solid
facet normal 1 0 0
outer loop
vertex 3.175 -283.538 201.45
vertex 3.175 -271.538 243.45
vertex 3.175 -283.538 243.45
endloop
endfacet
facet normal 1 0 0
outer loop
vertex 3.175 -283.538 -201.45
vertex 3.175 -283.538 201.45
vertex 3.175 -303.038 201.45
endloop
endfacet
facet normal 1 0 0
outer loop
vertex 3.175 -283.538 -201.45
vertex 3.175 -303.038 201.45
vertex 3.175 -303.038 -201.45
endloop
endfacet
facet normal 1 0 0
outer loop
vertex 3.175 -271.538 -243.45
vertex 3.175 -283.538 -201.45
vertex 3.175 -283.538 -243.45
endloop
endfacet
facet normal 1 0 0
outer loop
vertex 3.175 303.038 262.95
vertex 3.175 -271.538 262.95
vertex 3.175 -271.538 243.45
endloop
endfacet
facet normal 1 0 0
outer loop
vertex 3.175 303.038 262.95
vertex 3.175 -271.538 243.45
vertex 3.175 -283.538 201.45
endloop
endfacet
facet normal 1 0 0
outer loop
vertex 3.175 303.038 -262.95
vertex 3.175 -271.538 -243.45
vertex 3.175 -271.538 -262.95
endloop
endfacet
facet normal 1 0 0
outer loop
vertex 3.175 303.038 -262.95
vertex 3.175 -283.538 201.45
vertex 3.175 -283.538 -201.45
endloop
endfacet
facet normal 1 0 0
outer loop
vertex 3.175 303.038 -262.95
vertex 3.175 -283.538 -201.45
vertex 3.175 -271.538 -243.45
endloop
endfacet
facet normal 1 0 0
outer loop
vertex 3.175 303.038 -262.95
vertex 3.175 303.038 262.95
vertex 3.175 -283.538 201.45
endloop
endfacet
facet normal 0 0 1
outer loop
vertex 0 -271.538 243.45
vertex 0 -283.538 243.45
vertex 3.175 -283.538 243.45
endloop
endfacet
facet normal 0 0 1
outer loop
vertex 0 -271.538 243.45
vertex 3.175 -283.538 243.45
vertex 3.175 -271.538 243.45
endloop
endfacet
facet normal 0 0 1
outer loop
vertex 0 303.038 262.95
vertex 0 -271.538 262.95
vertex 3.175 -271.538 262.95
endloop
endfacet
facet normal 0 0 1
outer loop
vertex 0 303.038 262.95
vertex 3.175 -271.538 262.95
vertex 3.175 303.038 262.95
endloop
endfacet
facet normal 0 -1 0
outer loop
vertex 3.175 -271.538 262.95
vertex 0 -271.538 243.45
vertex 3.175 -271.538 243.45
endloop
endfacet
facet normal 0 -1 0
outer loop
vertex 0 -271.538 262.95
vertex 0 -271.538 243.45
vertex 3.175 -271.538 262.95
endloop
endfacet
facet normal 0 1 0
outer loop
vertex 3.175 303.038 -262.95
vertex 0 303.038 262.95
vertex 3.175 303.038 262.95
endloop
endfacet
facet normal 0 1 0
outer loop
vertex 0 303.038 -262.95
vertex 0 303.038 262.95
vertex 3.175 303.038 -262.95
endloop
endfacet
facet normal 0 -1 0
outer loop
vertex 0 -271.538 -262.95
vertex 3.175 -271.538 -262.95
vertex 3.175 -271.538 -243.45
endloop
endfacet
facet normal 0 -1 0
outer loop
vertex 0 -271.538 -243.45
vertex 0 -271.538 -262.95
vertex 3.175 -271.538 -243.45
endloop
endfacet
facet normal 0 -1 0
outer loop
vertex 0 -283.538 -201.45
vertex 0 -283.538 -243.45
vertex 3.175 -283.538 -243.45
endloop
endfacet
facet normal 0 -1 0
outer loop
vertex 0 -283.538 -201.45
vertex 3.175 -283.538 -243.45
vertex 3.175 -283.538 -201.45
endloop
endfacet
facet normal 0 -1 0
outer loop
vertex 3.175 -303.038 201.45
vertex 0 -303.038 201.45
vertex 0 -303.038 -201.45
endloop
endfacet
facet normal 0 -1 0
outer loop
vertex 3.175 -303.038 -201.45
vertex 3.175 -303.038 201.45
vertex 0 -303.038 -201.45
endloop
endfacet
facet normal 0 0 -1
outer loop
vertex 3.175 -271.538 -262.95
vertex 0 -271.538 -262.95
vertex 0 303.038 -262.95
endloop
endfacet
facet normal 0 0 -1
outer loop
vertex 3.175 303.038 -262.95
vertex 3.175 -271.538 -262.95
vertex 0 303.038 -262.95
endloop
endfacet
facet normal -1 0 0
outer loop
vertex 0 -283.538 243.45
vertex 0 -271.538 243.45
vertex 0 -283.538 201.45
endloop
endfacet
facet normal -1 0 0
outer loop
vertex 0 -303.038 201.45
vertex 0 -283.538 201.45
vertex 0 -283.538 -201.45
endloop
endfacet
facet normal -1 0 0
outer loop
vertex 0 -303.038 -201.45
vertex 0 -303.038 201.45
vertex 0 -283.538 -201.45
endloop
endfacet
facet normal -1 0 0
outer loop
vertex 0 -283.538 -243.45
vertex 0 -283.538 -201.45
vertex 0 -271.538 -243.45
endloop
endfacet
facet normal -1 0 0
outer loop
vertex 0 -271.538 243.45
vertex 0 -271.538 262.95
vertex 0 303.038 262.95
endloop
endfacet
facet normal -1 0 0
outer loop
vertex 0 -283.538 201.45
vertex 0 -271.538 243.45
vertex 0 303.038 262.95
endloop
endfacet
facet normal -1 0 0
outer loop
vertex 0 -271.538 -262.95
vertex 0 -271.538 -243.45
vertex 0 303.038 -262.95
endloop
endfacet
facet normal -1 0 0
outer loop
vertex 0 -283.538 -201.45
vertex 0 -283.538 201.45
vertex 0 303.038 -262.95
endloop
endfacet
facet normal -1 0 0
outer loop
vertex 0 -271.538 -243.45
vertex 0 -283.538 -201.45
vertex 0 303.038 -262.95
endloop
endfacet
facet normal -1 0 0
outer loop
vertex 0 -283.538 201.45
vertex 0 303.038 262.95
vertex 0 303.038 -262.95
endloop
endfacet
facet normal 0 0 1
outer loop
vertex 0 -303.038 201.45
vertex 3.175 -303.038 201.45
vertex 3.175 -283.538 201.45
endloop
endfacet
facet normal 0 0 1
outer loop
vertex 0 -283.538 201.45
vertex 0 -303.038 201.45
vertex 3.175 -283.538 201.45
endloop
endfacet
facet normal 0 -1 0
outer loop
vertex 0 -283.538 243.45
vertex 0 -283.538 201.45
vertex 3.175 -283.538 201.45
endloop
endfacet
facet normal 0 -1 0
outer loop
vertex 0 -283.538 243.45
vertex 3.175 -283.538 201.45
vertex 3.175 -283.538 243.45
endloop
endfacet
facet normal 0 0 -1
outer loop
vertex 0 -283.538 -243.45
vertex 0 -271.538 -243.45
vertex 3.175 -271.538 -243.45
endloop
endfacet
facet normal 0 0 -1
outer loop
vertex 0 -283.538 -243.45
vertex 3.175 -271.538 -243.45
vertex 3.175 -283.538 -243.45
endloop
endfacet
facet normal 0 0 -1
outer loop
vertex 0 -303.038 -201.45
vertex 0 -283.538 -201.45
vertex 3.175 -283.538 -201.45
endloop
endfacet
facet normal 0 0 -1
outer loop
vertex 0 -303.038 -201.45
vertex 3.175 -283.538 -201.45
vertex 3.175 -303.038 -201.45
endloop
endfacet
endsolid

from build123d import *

# Parameters (mm, degrees)
SKETCH1_W           = 525.9
SKETCH1_H           = 606.075
BOSS_EXTRUDE1_DEPTH = 3.175
CAVITY1_DEPTH       = 3.175
SKETCH2_W           = 42
SKETCH2_H           = 19.5
CUT_EXTRUDE1_DEPTH  = 402.228749632


# Read off the part's stored shape, not the designer's step: Cavity1
with BuildPart() as part:
    # Sketch1 → Boss-Extrude1 (new body)
    with BuildSketch(Plane(origin=(0, 0, 0), x_dir=(0, 0, -1), z_dir=(1, 0, 0))):
        Rectangle(SKETCH1_W, SKETCH1_H)
    extrude(amount=BOSS_EXTRUDE1_DEPTH)

    # Cavity1 outline → Cavity1 (cut)
    with BuildSketch(Plane.YZ):
        Polygon((-301.162499999, 201.45), (-283.5375, 201.45), (-283.5375, 243.45), (-271.5375, 243.45), (-271.5375, 261.074999999), (-286.5375, 261.074999999), (-286.7875, 261.372938397), (-286.7875, 261.377061601), (-286.5375, 261.674999999), (-286.5375, 262.95), (-301.162499999, 262.95), align=None)
        Polygon((-271.5375, -261.074999999), (-271.5375, -243.45), (-283.5375, -243.45), (-283.5375, -201.45), (-301.162499999, -201.45), (-301.162499999, -262.95), (-286.5375, -262.95), (-286.5375, -261.674999999), (-286.7875, -261.377061601), (-286.7875, -261.372938397), (-286.5375, -261.074999999), align=None)
    extrude(amount=CAVITY1_DEPTH, mode=Mode.SUBTRACT)

    # Sketch2 → Cut-Extrude1 (cut, through all)
    with BuildSketch(Plane(origin=(3.175, 0, 0), x_dir=(0, 0, -1), z_dir=(1, 0, 0))):
        Polygon((-243.45, -283.5375), (-243.45, -271.5375), (-262.95, -271.5375), (-262.95, -303.0375), (-243.45, -303.0375), align=None)
        with Locations((-222.45, -293.2875)):
            Rectangle(SKETCH2_W, SKETCH2_H)
        Polygon((262.95, -271.5375), (243.45, -271.5375), (243.45, -283.5375), (243.45, -303.0375), (262.95, -303.0375), align=None)
        with Locations((222.45, -293.2875)):
            Rectangle(SKETCH2_W, SKETCH2_H)
    extrude(amount=-CUT_EXTRUDE1_DEPTH, mode=Mode.SUBTRACT)


solid = part.part
